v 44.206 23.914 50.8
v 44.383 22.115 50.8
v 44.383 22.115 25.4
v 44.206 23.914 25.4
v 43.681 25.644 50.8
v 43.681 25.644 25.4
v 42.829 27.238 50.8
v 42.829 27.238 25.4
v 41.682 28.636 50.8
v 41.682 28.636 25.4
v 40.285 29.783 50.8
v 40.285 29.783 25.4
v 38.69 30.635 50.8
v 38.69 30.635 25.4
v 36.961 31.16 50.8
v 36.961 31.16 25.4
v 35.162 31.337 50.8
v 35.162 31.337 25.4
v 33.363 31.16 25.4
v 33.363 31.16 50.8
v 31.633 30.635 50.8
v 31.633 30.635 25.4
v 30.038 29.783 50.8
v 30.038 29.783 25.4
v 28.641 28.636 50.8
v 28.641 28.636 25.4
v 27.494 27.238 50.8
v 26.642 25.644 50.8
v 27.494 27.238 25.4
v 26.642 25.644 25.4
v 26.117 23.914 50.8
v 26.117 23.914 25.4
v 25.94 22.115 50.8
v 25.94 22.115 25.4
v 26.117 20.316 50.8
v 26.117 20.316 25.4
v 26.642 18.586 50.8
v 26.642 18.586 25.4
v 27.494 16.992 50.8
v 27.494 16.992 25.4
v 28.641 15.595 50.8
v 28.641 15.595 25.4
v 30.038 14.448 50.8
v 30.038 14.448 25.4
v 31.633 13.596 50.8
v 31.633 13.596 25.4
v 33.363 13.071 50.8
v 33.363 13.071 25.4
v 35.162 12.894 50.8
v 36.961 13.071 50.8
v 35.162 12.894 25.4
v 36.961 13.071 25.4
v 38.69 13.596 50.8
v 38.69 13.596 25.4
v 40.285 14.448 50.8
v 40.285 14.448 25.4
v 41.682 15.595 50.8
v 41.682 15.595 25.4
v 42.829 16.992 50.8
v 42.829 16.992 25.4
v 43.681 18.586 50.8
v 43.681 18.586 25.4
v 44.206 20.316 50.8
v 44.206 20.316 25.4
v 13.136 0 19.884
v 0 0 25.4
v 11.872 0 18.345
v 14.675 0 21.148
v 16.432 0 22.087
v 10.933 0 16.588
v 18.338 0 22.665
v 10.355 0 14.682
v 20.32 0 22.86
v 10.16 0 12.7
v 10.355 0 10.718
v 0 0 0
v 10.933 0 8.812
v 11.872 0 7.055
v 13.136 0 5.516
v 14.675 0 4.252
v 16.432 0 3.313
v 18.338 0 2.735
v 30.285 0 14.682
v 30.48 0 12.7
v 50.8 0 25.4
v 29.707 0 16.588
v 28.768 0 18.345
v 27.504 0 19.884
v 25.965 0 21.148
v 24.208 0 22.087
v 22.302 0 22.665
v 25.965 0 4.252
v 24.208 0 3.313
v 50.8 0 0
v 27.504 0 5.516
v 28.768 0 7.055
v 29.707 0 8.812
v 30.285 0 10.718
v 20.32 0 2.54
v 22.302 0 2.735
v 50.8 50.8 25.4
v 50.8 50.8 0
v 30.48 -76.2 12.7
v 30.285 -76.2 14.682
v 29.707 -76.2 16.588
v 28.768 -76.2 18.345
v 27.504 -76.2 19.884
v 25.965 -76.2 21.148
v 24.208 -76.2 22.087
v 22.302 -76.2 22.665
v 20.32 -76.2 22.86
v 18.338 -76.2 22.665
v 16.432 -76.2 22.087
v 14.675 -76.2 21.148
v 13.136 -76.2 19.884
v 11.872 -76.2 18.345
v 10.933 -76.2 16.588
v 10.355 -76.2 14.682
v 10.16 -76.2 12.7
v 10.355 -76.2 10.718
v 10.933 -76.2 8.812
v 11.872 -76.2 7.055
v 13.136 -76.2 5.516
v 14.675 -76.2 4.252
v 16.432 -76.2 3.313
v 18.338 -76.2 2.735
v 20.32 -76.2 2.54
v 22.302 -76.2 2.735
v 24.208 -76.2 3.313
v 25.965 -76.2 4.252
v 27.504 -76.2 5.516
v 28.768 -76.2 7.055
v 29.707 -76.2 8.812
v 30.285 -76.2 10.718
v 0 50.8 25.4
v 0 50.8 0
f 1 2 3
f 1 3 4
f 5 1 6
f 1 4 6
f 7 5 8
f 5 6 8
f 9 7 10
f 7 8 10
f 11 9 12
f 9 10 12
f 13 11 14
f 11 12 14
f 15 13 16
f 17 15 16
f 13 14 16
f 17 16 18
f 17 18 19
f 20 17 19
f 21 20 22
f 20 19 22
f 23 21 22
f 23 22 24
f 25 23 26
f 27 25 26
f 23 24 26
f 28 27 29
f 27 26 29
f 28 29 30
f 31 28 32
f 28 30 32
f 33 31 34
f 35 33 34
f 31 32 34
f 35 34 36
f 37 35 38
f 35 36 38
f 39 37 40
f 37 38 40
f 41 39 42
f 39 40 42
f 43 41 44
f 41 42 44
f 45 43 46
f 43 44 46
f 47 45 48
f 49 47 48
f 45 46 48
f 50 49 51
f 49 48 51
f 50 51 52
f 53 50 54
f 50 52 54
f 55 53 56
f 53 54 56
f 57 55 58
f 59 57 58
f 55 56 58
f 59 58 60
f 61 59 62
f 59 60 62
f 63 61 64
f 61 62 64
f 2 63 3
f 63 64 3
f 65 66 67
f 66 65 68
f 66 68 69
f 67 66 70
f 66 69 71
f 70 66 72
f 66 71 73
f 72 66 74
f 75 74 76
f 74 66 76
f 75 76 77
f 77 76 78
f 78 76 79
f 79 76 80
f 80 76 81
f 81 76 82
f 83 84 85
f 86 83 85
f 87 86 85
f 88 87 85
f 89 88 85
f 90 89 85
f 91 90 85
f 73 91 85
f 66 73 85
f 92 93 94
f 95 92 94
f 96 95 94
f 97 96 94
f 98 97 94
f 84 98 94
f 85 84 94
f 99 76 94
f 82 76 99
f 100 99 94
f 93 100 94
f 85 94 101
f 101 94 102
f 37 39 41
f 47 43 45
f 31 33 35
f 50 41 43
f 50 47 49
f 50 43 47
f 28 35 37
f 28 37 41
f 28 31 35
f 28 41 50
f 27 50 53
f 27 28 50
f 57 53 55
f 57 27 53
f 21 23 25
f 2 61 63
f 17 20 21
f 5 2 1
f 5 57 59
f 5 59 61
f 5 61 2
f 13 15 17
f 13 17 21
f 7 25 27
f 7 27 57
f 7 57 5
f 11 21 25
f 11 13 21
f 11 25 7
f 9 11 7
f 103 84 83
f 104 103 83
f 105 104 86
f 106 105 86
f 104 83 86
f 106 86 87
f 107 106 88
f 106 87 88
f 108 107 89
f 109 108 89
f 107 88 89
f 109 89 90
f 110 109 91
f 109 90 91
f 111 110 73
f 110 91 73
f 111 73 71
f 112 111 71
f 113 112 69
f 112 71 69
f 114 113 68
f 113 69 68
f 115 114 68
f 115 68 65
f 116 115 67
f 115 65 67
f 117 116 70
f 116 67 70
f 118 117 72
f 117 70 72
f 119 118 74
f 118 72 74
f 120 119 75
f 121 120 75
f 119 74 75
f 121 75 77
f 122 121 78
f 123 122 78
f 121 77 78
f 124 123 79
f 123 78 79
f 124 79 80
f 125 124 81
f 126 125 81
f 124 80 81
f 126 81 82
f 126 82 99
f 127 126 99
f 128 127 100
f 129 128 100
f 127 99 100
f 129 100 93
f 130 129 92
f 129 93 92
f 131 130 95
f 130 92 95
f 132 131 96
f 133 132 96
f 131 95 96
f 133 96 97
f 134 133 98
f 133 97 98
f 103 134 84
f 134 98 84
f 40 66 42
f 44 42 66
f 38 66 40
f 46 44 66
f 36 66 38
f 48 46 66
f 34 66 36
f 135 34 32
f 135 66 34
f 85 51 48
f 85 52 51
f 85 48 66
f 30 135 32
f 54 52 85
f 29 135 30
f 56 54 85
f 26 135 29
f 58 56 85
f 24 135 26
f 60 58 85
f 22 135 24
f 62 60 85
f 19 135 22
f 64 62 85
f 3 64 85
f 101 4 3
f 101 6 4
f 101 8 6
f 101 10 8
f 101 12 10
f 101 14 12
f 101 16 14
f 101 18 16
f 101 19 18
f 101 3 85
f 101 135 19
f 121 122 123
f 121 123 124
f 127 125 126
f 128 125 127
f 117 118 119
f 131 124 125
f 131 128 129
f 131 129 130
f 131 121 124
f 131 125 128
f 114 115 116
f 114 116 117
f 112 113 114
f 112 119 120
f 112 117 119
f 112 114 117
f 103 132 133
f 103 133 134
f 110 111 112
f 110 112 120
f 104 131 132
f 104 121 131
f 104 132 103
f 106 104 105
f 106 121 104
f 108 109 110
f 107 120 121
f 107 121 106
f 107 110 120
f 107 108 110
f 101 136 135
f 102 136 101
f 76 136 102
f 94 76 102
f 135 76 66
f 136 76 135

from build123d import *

# Parameters (mm, degrees)
F0_W     = 50.8
F0_H     = 50.8
F1_DEPTH = 25.4
F2_R     = 10.16
F3_DEPTH = 76.2
F4_R     = 9.221504
F5_DEPTH = 25.4


with BuildPart() as f1:
    # F0 (on Top) → F1 (new body)
    with BuildSketch(Plane.XY):
        with Locations((25.4, 25.4)):
            Rectangle(F0_W, F0_H)
    extrude(amount=F1_DEPTH)

    # F2 (on face) → F3 (join)
    with BuildSketch(Plane.XZ):
        with Locations((20.32, 12.7)):
            Circle(F2_R)
    extrude(amount=F3_DEPTH)

    # F4 (on face) → F5 (join)
    with BuildSketch(Plane.XY.offset(25.4)):
        with Locations((35.16157, 22.115249)):
            Circle(F4_R)
    extrude(amount=F5_DEPTH)


solid = f1.part
